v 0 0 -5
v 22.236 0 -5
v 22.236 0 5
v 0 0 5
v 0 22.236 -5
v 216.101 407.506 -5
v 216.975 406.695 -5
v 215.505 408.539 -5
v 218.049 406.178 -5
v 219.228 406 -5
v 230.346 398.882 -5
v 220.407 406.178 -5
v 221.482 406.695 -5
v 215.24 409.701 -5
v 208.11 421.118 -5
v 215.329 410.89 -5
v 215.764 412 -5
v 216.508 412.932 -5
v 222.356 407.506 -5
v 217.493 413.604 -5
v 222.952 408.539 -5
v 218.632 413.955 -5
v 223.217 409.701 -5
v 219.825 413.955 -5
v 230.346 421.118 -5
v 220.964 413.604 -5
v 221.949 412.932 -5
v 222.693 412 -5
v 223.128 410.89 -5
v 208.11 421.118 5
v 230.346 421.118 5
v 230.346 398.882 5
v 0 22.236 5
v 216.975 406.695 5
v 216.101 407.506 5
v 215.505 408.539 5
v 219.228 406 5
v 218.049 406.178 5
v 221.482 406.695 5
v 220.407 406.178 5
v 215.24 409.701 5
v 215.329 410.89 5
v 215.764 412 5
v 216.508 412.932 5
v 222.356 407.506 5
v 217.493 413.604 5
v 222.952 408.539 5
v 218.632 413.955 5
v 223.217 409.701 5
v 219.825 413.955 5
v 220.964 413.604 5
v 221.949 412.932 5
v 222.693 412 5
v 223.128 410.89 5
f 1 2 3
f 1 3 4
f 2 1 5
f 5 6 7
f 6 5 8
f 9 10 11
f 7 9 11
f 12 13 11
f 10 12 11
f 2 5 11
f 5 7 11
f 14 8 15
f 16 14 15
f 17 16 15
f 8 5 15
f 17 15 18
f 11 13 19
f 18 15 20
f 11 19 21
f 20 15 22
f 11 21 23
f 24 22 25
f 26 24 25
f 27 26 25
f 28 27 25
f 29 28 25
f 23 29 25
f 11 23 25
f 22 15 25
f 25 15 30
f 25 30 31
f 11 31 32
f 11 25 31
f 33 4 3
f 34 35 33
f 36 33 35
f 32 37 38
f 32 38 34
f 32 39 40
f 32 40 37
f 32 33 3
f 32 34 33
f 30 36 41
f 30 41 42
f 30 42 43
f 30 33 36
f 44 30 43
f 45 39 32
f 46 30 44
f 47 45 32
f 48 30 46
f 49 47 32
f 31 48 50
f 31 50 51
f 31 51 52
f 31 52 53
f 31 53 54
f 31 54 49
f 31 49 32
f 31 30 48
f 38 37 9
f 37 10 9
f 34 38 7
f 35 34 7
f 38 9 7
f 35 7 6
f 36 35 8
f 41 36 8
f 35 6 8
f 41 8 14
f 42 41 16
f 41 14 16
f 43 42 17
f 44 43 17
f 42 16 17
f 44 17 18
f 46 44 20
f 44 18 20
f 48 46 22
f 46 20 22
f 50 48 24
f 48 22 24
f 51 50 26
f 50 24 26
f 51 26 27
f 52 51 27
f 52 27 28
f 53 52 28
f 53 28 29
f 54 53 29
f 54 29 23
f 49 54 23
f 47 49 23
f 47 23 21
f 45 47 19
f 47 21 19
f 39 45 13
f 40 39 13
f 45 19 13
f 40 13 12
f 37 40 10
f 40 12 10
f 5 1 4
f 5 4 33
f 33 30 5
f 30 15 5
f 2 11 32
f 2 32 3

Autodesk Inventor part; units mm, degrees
ref_plane "YZ Plane" through (0, 0, 0) normal (1, 0, 0) x (0, 1, 0)
ref_plane "XZ Plane" through (0, 0, 0) normal (0, 1, 0) x (-1, 0, 0)
ref_plane "XY Plane" through (0, 0, 0) normal (0, 0, 1) x (1, 0, 0)
sketch "Sketch1" plane through (0, 0, 0) normal (0, 0, 1) x (1, 0, 0)
  line L0 (0, 22.2362) -> (22.2362, 22.2362) construction
  line L1 (22.2362, 22.2362) -> (22.2362, 0) construction
  line L2 (22.2362, 0) -> (0, 0)
  line L3 (0, 0) -> (0, 22.2362)
  line L4 (0, 22.2362) -> (22.2362, 0) construction
  line L5 (22.2362, 22.2362) -> (0, 0) construction
  line L6 (208.1103, 421.1181) -> (230.3465, 421.1181)
  line L7 (230.3465, 421.1181) -> (230.3465, 398.8819)
  line L8 (230.3465, 398.8819) -> (208.1103, 398.8819) construction
  line L9 (208.1103, 398.8819) -> (208.1103, 421.1181) construction
  line L10 (208.1103, 421.1181) -> (230.3465, 398.8819) construction
  line L11 (230.3465, 421.1181) -> (208.1103, 398.8819) construction
  line L12 (208.1103, 421.1181) -> (0, 22.2362)
  line L13 (230.3465, 398.8819) -> (22.2362, 0)
  line L14 (0, 0) -> (230.3465, 421.1181) construction
  line L15 (-46.0693, 0) -> (276.4159, 0) construction
  point P0 (11.1181, 11.1181)
  point P1 (219.2284, 410)
  point P2 (115.1733, 210.5591)
  dimension "d1" = 480
  dimension "d14" = 410
  dimension "d15" = 30
extrude "Extrusion1" add sketch "Sketch1" along normal mid plane 10
sketch "Sketch2" plane through (0, 0, 5) normal (0, 0, 1) x (1, 0, 0)
  line L0 (230.3465, 421.1181) -> (208.1103, 421.1181) construction
  line L1 (230.3465, 398.8819) -> (230.3465, 421.1181) construction
  line L2 (208.1103, 421.1181) -> (230.3465, 398.8819) construction
  point P0 (0, 0)
  point P1 (219.2284, 410)
hole "Hole1" at (219.2284, 410, 5) direction (0, 0, -1) diameter 8 end through all
properties part number "Support - Left"
